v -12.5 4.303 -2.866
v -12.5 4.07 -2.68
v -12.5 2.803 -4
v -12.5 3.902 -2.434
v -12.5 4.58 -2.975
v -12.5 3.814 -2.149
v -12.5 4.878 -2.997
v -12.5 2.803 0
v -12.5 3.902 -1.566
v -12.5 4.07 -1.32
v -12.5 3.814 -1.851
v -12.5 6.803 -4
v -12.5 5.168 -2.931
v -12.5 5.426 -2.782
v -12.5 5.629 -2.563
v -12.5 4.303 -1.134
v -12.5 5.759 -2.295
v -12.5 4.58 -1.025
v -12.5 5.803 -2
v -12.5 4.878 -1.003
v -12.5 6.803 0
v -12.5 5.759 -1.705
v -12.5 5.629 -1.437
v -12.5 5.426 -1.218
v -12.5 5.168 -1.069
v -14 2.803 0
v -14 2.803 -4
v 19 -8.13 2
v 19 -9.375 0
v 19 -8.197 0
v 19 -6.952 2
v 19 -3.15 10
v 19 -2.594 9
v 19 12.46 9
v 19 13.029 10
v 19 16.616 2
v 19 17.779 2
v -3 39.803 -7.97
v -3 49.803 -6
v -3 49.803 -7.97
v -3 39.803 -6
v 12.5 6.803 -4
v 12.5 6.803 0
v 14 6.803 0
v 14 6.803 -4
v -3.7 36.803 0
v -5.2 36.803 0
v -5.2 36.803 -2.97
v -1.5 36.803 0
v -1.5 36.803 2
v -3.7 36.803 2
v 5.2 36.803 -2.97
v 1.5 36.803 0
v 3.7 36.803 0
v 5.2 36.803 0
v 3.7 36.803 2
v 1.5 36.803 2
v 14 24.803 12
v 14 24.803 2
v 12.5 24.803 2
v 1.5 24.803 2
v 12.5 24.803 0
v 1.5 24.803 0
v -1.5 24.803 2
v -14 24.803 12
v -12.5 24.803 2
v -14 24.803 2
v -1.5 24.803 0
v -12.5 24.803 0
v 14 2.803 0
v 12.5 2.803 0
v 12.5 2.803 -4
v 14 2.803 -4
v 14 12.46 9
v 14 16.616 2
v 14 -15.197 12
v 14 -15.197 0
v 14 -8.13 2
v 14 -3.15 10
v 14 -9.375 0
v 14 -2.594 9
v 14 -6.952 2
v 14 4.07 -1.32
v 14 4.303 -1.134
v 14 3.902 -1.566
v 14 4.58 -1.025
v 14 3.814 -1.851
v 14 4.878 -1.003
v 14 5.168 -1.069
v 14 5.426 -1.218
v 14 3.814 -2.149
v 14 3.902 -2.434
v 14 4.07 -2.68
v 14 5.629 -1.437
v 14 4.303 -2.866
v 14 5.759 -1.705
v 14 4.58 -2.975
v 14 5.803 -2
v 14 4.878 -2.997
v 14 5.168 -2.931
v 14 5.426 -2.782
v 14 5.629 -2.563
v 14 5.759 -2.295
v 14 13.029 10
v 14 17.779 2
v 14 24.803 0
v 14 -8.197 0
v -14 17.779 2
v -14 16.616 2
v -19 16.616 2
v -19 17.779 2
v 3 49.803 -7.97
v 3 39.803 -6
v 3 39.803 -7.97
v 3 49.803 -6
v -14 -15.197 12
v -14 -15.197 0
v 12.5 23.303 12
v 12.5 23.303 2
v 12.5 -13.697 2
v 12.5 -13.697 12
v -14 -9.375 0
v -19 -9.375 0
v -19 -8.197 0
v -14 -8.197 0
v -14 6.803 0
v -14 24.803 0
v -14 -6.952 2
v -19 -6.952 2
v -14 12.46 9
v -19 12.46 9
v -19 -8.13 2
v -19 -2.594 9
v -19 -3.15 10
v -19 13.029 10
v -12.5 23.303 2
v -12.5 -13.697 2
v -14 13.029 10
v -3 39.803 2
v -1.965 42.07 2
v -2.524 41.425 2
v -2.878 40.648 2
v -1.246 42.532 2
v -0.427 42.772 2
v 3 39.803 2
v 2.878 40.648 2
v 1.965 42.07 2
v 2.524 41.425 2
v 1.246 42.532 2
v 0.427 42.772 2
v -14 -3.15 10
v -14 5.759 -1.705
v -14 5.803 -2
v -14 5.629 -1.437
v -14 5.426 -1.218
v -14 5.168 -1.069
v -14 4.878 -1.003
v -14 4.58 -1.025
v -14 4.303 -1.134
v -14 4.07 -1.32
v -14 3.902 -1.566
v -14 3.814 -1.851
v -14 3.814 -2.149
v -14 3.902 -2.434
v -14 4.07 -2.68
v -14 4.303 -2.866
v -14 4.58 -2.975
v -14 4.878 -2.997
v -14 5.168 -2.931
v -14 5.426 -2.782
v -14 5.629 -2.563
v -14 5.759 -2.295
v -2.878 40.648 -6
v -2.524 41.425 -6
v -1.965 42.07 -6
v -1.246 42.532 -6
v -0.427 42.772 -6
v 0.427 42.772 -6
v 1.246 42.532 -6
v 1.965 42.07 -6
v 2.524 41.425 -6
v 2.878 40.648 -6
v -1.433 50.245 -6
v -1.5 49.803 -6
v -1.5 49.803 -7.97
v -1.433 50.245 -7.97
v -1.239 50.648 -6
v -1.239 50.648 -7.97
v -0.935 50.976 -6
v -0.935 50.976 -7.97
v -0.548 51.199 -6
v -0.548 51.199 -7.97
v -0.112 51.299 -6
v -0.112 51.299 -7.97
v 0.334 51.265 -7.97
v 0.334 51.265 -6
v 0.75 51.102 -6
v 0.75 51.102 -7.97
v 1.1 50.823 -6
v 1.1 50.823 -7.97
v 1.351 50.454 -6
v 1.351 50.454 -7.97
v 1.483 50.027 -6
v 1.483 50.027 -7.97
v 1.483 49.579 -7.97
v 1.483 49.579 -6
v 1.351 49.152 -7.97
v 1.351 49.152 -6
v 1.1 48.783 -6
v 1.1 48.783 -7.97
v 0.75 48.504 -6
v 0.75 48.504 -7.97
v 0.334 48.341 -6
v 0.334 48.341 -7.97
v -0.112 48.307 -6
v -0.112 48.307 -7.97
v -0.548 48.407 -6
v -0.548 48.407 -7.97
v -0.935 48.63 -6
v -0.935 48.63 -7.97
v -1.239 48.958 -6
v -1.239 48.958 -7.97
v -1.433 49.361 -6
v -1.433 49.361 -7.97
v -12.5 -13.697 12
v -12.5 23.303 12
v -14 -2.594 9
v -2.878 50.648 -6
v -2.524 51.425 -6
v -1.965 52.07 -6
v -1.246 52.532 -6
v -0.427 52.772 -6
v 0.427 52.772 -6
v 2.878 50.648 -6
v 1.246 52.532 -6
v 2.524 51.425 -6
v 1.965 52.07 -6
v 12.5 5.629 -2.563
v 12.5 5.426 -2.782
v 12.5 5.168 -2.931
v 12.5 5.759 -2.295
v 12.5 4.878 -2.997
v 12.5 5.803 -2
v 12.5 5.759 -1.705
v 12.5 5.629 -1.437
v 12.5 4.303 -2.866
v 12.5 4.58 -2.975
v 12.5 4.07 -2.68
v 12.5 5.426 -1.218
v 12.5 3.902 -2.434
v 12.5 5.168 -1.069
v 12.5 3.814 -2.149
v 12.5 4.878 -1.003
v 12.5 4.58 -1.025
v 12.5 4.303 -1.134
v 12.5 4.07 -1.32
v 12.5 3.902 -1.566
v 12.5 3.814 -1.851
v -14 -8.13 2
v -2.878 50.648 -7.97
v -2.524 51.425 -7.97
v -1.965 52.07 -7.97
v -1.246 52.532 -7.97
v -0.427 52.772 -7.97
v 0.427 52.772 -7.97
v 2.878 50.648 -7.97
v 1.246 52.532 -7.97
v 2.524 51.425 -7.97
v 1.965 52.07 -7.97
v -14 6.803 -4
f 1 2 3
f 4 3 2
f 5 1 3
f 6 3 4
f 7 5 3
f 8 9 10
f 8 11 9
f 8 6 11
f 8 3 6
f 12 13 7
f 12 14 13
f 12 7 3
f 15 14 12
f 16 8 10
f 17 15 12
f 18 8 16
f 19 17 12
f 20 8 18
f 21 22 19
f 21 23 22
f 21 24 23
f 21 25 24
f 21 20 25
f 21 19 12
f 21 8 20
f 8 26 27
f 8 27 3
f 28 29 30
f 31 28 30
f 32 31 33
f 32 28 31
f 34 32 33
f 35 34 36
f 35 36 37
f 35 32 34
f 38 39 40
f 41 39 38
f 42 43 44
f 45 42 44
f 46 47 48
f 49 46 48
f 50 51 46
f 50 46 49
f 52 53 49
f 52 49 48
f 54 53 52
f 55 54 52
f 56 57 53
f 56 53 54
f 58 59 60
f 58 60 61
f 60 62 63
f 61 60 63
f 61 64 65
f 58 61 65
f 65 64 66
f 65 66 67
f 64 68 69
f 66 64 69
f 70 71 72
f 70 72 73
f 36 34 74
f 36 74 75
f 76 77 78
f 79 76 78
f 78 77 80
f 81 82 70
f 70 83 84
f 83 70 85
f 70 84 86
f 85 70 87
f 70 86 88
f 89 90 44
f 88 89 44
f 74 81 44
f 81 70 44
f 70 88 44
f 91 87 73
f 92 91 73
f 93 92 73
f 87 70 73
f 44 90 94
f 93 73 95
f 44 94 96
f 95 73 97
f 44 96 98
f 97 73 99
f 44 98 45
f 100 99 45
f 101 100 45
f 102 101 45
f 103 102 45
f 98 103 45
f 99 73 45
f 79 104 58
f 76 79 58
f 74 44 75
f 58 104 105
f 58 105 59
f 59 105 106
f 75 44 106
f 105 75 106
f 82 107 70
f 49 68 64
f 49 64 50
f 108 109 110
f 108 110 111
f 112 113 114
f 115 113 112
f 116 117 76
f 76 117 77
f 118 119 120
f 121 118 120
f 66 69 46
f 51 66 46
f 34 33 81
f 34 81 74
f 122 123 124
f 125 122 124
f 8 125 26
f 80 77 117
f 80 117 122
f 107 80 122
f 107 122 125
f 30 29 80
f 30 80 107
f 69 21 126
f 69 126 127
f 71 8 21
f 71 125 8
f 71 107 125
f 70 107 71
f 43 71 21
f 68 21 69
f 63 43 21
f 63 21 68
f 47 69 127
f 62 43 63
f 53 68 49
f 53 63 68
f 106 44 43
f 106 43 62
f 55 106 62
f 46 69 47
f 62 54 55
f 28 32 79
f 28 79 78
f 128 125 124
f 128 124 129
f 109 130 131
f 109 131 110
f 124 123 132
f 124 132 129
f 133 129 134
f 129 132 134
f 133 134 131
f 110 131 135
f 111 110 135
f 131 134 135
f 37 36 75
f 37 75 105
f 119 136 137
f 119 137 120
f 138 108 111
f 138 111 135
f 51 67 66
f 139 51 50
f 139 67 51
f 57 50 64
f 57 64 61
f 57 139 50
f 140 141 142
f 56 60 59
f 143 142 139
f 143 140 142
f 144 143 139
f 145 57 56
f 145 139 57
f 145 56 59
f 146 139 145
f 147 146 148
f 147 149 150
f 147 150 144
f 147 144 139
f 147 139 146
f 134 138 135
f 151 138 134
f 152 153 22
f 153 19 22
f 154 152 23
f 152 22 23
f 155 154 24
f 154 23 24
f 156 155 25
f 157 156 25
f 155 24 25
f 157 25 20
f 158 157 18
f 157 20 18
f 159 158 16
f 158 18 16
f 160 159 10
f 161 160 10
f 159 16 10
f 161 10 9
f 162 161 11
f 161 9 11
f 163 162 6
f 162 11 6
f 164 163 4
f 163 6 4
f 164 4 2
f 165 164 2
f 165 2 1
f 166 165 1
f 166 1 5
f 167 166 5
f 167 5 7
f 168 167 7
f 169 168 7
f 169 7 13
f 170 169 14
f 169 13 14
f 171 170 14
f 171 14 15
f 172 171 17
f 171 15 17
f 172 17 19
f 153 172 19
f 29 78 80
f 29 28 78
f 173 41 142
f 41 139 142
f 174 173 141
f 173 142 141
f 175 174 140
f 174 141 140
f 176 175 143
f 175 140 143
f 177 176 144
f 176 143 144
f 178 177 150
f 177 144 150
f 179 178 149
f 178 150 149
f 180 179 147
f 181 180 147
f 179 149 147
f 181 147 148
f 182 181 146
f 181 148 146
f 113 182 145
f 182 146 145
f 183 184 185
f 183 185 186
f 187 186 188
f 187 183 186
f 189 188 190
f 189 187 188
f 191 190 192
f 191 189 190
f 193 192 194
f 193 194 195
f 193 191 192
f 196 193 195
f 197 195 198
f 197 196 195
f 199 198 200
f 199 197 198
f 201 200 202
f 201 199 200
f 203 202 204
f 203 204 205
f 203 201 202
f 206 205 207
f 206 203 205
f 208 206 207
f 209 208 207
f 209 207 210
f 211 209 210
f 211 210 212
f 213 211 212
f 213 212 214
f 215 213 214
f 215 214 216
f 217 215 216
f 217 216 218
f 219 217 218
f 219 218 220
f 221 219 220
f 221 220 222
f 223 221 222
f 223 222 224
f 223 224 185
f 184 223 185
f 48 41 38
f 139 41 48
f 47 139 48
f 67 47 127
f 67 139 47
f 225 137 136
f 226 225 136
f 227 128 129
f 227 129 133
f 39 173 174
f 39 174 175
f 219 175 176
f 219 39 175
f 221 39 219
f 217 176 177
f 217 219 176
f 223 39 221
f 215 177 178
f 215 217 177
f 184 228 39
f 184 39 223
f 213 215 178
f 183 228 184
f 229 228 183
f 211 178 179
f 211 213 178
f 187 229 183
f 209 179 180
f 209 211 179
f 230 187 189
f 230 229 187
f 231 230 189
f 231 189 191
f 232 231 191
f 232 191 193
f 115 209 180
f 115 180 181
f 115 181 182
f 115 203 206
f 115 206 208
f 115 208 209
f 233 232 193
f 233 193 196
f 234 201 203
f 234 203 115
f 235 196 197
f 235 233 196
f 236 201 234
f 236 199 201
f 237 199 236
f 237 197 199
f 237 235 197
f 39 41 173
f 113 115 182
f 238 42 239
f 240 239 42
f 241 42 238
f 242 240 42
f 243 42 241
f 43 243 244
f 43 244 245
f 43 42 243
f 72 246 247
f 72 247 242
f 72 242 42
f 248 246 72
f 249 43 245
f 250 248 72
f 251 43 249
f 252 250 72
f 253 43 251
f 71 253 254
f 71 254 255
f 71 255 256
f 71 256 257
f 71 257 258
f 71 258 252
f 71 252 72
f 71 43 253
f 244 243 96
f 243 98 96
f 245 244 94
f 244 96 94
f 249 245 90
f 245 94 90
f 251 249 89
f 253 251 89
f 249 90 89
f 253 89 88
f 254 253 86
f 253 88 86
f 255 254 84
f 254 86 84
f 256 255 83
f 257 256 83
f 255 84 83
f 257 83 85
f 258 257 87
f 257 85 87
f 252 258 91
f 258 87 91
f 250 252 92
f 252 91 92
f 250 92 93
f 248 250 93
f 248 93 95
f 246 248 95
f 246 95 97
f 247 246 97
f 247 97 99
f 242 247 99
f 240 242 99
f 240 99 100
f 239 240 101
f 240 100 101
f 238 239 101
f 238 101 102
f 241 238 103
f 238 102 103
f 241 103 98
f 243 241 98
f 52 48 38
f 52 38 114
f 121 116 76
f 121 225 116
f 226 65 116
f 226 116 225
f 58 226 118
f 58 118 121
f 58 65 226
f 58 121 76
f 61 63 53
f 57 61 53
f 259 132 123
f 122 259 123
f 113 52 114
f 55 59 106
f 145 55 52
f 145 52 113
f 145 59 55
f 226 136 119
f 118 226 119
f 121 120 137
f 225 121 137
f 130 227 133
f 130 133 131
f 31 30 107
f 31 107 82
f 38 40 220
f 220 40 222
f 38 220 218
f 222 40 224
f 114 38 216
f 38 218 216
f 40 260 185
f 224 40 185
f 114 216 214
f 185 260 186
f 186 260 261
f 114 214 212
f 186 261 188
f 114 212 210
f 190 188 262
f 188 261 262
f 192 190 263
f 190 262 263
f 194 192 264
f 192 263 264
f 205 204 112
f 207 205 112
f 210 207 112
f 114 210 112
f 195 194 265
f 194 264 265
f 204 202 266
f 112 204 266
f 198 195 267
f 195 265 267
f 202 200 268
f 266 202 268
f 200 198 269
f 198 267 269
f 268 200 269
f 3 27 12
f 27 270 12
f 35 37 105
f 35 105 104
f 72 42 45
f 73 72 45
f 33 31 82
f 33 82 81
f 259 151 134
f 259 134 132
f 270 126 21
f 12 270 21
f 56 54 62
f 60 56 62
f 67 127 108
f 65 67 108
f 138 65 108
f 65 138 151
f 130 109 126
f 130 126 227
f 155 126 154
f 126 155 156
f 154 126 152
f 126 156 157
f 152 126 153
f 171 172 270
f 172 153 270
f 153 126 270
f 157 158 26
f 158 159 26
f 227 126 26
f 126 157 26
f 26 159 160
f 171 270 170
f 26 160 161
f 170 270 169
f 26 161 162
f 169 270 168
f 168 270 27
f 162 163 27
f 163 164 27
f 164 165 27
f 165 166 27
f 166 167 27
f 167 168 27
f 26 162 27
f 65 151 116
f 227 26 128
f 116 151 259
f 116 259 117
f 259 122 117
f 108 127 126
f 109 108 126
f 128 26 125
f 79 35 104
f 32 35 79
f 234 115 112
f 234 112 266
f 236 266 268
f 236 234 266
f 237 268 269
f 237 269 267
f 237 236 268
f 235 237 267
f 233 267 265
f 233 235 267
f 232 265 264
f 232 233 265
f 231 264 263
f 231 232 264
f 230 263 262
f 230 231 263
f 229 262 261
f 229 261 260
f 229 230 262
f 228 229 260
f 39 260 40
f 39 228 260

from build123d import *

# Parameters (mm, degrees)
F0_W      = 1.5
F0_H      = 2
F0_H_2    = 12
F0_W_2    = 25
F0_H_3    = 16.5
F1_DEPTH  = 2
F2_DEPTH  = 12
F3_DEPTH  = 4
F4_DEPTH  = 7.97
F5_DEPTH  = 6
F6_SIZE2  = 5
F6_SIZE   = 3
F7_R      = 1
F8_DEPTH  = 15
F9_DEPTH  = 19
F10_DEPTH = 12.5


with BuildPart() as f1:
    # F0 (on Top) → F1 (new body)
    with BuildSketch(Plane.XY):
        Polygon((-5.2, 36.80300952), (-14, 24.80300952), (-12.5, 24.80300952), (-3.7, 36.80300952), align=None)
        Polygon((14, 24.80300952), (5.2, 36.80300952), (3.7, 36.80300952), (12.5, 24.80300952), align=None)
        Polygon((-12.5, 2.80300952), (-14, 2.80300952), (-14, -15.19699048), (14, -15.19699048), (14, 2.80300952), (12.5, 2.80300952), (12.5, -13.69699048), (-12.5, -13.69699048), align=None)
        with Locations((-13.25, 5.80300952)):
            Rectangle(F0_W, F0_H)
        with Locations((-13.25, 3.80300952)):
            Rectangle(F0_W, F0_H)
        with Locations((13.25, 5.80300952)):
            Rectangle(F0_W, F0_H)
        with Locations((13.25, 3.80300952)):
            Rectangle(F0_W, F0_H)
        with BuildLine():
            Line((-3, 39.80300952), (-5.2, 36.80300952))
            Line((-5.2, 36.80300952), (-3.7, 36.80300952))
            Line((-3.7, 36.80300952), (-1.5, 36.80300952))
            Line((-1.5, 36.80300952), (0, 36.80300952))
            Line((0, 36.80300952), (0, 38.30300952))
            ThreePointArc((0, 38.30300952), (-1.0606601718, 38.7423493483), (-1.5, 39.80300952))
            Line((-1.5, 39.80300952), (-3, 39.80300952))
        make_face()
        with BuildLine():
            Line((5.2, 36.80300952), (3, 39.80300952))
            Line((3, 39.80300952), (1.5, 39.80300952))
            ThreePointArc((1.5, 39.80300952), (1.0606601718, 38.7423493483), (0, 38.30300952))
            Line((0, 38.30300952), (0, 36.80300952))
            Line((0, 36.80300952), (1.5, 36.80300952))
            Line((1.5, 36.80300952), (3.7, 36.80300952))
            Line((3.7, 36.80300952), (5.2, 36.80300952))
        make_face()
        Polygon((-12.5, 24.80300952), (-14, 24.80300952), (-14, 6.80300952), (-12.5, 6.80300952), (-12.5, 23.30300952), (12.5, 23.30300952), (12.5, 6.80300952), (14, 6.80300952), (14, 24.80300952), (12.5, 24.80300952), (1.5, 24.80300952), (0, 24.80300952), (-1.5, 24.80300952), align=None)
        with Locations((0.75, 30.80300952)):
            Rectangle(F0_W, F0_H_2)
        with Locations((-0.75, 30.80300952)):
            Rectangle(F0_W, F0_H_2)
        with BuildLine():
            ThreePointArc((0, 38.30300952), (1.0606601718, 38.7423493483), (1.5, 39.80300952))
            Line((1.5, 39.80300952), (0, 39.80300952))
            Line((0, 39.80300952), (0, 38.30300952))
        make_face()
        with BuildLine():
            Line((0, 39.80300952), (-1.5, 39.80300952))
            ThreePointArc((-1.5, 39.80300952), (-1.0606601718, 38.7423493483), (0, 38.30300952))
            Line((0, 38.30300952), (0, 39.80300952))
        make_face()
        with Locations((0, 15.05300952)):
            Rectangle(F0_W_2, F0_H_3)
        with Locations((0, -5.44699048)):
            Rectangle(F0_W_2, F0_H_3)
        with Locations((0, 3.80300952)):
            Rectangle(F0_W_2, F0_H)
        with Locations((0, 5.80300952)):
            Rectangle(F0_W_2, F0_H)
        with BuildLine():
            ThreePointArc((3, 39.80300952), (0, 42.80300952), (-3, 39.80300952))
            Line((-3, 39.80300952), (-1.5, 39.80300952))
            ThreePointArc((-1.5, 39.80300952), (0, 41.30300952), (1.5, 39.80300952))
            Line((1.5, 39.80300952), (3, 39.80300952))
        make_face()
        with BuildLine():
            ThreePointArc((1.5, 39.80300952), (0, 41.30300952), (-1.5, 39.80300952))
            Line((-1.5, 39.80300952), (0, 39.80300952))
            Line((0, 39.80300952), (1.5, 39.80300952))
        make_face()
    extrude(amount=F1_DEPTH)

    # F0 (on Top) → F2 (join)
    with BuildSketch(Plane.XY):
        Polygon((-12.5, 2.80300952), (-14, 2.80300952), (-14, -15.19699048), (14, -15.19699048), (14, 2.80300952), (12.5, 2.80300952), (12.5, -13.69699048), (-12.5, -13.69699048), align=None)
        Polygon((-12.5, 24.80300952), (-14, 24.80300952), (-14, 6.80300952), (-12.5, 6.80300952), (-12.5, 23.30300952), (12.5, 23.30300952), (12.5, 6.80300952), (14, 6.80300952), (14, 24.80300952), (12.5, 24.80300952), (1.5, 24.80300952), (0, 24.80300952), (-1.5, 24.80300952), align=None)
        with Locations((13.25, 5.80300952)):
            Rectangle(F0_W, F0_H)
        with Locations((13.25, 3.80300952)):
            Rectangle(F0_W, F0_H)
        with Locations((-13.25, 3.80300952)):
            Rectangle(F0_W, F0_H)
        with Locations((-13.25, 5.80300952)):
            Rectangle(F0_W, F0_H)
    extrude(amount=F2_DEPTH)

    # F0 (on Top) → F3 (join)
    with BuildSketch(Plane.XY):
        with Locations((13.25, 5.80300952)):
            Rectangle(F0_W, F0_H)
        with Locations((13.25, 3.80300952)):
            Rectangle(F0_W, F0_H)
        with Locations((-13.25, 3.80300952)):
            Rectangle(F0_W, F0_H)
        with Locations((-13.25, 5.80300952)):
            Rectangle(F0_W, F0_H)
    extrude(amount=-F3_DEPTH)

    # F0 (on Top) → F4 (join)
    with BuildSketch(Plane.XY):
        with BuildLine():
            ThreePointArc((3, 39.80300952), (0, 42.80300952), (-3, 39.80300952))
            Line((-3, 39.80300952), (-1.5, 39.80300952))
            ThreePointArc((-1.5, 39.80300952), (0, 41.30300952), (1.5, 39.80300952))
            Line((1.5, 39.80300952), (3, 39.80300952))
        make_face()
        with BuildLine():
            ThreePointArc((1.5, 39.80300952), (0, 41.30300952), (-1.5, 39.80300952))
            Line((-1.5, 39.80300952), (0, 39.80300952))
            Line((0, 39.80300952), (1.5, 39.80300952))
        make_face()
        with BuildLine():
            Line((5.2, 36.80300952), (3, 39.80300952))
            Line((3, 39.80300952), (1.5, 39.80300952))
            ThreePointArc((1.5, 39.80300952), (1.0606601718, 38.7423493483), (0, 38.30300952))
            Line((0, 38.30300952), (0, 36.80300952))
            Line((0, 36.80300952), (1.5, 36.80300952))
            Line((1.5, 36.80300952), (3.7, 36.80300952))
            Line((3.7, 36.80300952), (5.2, 36.80300952))
        make_face()
        with BuildLine():
            Line((-3, 39.80300952), (-5.2, 36.80300952))
            Line((-5.2, 36.80300952), (-3.7, 36.80300952))
            Line((-3.7, 36.80300952), (-1.5, 36.80300952))
            Line((-1.5, 36.80300952), (0, 36.80300952))
            Line((0, 36.80300952), (0, 38.30300952))
            ThreePointArc((0, 38.30300952), (-1.0606601718, 38.7423493483), (-1.5, 39.80300952))
            Line((-1.5, 39.80300952), (-3, 39.80300952))
        make_face()
        with BuildLine():
            Line((-3, 49.80300952), (-3, 39.80300952))
            ThreePointArc((-3, 39.80300952), (0, 42.80300952), (3, 39.80300952))
            Line((3, 39.80300952), (3, 49.80300952))
            Line((3, 49.80300952), (1.5, 49.80300952))
            ThreePointArc((1.5, 49.80300952), (0, 48.30300952), (-1.5, 49.80300952))
            Line((-1.5, 49.80300952), (-3, 49.80300952))
        make_face()
        with BuildLine():
            ThreePointArc((3, 49.80300952), (0, 52.80300952), (-3, 49.80300952))
            Line((-3, 49.80300952), (-1.5, 49.80300952))
            ThreePointArc((-1.5, 49.80300952), (0, 51.30300952), (1.5, 49.80300952))
            Line((1.5, 49.80300952), (3, 49.80300952))
        make_face()
        with BuildLine():
            Line((0, 39.80300952), (-1.5, 39.80300952))
            ThreePointArc((-1.5, 39.80300952), (-1.0606601718, 38.7423493483), (0, 38.30300952))
            Line((0, 38.30300952), (0, 39.80300952))
        make_face()
        with BuildLine():
            ThreePointArc((0, 38.30300952), (1.0606601718, 38.7423493483), (1.5, 39.80300952))
            Line((1.5, 39.80300952), (0, 39.80300952))
            Line((0, 39.80300952), (0, 38.30300952))
        make_face()
    extrude(amount=-F4_DEPTH)

    # F0 (on Top) → F5 (cut)
    with BuildSketch(Plane.XY):
        with BuildLine():
            Line((-3, 49.80300952), (-3, 39.80300952))
            ThreePointArc((-3, 39.80300952), (0, 42.80300952), (3, 39.80300952))
            Line((3, 39.80300952), (3, 49.80300952))
            Line((3, 49.80300952), (1.5, 49.80300952))
            ThreePointArc((1.5, 49.80300952), (0, 48.30300952), (-1.5, 49.80300952))
            Line((-1.5, 49.80300952), (-3, 49.80300952))
        make_face()
        with BuildLine():
            ThreePointArc((3, 49.80300952), (0, 52.80300952), (-3, 49.80300952))
            Line((-3, 49.80300952), (-1.5, 49.80300952))
            ThreePointArc((-1.5, 49.80300952), (0, 51.30300952), (1.5, 49.80300952))
            Line((1.5, 49.80300952), (3, 49.80300952))
        make_face()
    extrude(amount=-F5_DEPTH, mode=Mode.SUBTRACT)

    # F6
    f6_edges = [f1.edges().sort_by_distance(p)[0] for p in [
        (0, 36.80301, -7.97),
    ]]
    f6_side = f1.faces().sort_by_distance((0, 43.604594, -7.97))[0]
    chamfer(f6_edges, length=F6_SIZE, length2=F6_SIZE2, reference=f6_side)

    # F7 (on Right) → F8 (cut, symmetric)
    with BuildSketch(Plane.YZ):
        with Locations((4.80300952, -2)):
            Circle(F7_R)
    extrude(amount=F8_DEPTH, both=True, mode=Mode.SUBTRACT)

    # F7 (on Right) → F9 (join, symmetric)
    with BuildSketch(Plane.YZ):
        Polygon((-9.3749196136, 0), (-8.19699048, 0), (-6.9519731405, 2), (-8.1299022741, 2), align=None)
        Polygon((-8.1299022741, 2), (-6.9519731405, 2), (-2.5944124523, 9), (12.4597597892, 9), (16.615620691, 2), (17.7785794425, 2), (13.0290241263, 10), (-3.1498329163, 10), align=None)
    extrude(amount=F9_DEPTH, both=True)

    # F7 (on Right) → F10 (cut, symmetric)
    with BuildSketch(Plane.YZ):
        Polygon((-8.1299022741, 2), (-6.9519731405, 2), (-2.5944124523, 9), (12.4597597892, 9), (16.615620691, 2), (17.7785794425, 2), (13.0290241263, 10), (-3.1498329163, 10), align=None)
    extrude(amount=F10_DEPTH, both=True, mode=Mode.SUBTRACT)


solid = f1.part
